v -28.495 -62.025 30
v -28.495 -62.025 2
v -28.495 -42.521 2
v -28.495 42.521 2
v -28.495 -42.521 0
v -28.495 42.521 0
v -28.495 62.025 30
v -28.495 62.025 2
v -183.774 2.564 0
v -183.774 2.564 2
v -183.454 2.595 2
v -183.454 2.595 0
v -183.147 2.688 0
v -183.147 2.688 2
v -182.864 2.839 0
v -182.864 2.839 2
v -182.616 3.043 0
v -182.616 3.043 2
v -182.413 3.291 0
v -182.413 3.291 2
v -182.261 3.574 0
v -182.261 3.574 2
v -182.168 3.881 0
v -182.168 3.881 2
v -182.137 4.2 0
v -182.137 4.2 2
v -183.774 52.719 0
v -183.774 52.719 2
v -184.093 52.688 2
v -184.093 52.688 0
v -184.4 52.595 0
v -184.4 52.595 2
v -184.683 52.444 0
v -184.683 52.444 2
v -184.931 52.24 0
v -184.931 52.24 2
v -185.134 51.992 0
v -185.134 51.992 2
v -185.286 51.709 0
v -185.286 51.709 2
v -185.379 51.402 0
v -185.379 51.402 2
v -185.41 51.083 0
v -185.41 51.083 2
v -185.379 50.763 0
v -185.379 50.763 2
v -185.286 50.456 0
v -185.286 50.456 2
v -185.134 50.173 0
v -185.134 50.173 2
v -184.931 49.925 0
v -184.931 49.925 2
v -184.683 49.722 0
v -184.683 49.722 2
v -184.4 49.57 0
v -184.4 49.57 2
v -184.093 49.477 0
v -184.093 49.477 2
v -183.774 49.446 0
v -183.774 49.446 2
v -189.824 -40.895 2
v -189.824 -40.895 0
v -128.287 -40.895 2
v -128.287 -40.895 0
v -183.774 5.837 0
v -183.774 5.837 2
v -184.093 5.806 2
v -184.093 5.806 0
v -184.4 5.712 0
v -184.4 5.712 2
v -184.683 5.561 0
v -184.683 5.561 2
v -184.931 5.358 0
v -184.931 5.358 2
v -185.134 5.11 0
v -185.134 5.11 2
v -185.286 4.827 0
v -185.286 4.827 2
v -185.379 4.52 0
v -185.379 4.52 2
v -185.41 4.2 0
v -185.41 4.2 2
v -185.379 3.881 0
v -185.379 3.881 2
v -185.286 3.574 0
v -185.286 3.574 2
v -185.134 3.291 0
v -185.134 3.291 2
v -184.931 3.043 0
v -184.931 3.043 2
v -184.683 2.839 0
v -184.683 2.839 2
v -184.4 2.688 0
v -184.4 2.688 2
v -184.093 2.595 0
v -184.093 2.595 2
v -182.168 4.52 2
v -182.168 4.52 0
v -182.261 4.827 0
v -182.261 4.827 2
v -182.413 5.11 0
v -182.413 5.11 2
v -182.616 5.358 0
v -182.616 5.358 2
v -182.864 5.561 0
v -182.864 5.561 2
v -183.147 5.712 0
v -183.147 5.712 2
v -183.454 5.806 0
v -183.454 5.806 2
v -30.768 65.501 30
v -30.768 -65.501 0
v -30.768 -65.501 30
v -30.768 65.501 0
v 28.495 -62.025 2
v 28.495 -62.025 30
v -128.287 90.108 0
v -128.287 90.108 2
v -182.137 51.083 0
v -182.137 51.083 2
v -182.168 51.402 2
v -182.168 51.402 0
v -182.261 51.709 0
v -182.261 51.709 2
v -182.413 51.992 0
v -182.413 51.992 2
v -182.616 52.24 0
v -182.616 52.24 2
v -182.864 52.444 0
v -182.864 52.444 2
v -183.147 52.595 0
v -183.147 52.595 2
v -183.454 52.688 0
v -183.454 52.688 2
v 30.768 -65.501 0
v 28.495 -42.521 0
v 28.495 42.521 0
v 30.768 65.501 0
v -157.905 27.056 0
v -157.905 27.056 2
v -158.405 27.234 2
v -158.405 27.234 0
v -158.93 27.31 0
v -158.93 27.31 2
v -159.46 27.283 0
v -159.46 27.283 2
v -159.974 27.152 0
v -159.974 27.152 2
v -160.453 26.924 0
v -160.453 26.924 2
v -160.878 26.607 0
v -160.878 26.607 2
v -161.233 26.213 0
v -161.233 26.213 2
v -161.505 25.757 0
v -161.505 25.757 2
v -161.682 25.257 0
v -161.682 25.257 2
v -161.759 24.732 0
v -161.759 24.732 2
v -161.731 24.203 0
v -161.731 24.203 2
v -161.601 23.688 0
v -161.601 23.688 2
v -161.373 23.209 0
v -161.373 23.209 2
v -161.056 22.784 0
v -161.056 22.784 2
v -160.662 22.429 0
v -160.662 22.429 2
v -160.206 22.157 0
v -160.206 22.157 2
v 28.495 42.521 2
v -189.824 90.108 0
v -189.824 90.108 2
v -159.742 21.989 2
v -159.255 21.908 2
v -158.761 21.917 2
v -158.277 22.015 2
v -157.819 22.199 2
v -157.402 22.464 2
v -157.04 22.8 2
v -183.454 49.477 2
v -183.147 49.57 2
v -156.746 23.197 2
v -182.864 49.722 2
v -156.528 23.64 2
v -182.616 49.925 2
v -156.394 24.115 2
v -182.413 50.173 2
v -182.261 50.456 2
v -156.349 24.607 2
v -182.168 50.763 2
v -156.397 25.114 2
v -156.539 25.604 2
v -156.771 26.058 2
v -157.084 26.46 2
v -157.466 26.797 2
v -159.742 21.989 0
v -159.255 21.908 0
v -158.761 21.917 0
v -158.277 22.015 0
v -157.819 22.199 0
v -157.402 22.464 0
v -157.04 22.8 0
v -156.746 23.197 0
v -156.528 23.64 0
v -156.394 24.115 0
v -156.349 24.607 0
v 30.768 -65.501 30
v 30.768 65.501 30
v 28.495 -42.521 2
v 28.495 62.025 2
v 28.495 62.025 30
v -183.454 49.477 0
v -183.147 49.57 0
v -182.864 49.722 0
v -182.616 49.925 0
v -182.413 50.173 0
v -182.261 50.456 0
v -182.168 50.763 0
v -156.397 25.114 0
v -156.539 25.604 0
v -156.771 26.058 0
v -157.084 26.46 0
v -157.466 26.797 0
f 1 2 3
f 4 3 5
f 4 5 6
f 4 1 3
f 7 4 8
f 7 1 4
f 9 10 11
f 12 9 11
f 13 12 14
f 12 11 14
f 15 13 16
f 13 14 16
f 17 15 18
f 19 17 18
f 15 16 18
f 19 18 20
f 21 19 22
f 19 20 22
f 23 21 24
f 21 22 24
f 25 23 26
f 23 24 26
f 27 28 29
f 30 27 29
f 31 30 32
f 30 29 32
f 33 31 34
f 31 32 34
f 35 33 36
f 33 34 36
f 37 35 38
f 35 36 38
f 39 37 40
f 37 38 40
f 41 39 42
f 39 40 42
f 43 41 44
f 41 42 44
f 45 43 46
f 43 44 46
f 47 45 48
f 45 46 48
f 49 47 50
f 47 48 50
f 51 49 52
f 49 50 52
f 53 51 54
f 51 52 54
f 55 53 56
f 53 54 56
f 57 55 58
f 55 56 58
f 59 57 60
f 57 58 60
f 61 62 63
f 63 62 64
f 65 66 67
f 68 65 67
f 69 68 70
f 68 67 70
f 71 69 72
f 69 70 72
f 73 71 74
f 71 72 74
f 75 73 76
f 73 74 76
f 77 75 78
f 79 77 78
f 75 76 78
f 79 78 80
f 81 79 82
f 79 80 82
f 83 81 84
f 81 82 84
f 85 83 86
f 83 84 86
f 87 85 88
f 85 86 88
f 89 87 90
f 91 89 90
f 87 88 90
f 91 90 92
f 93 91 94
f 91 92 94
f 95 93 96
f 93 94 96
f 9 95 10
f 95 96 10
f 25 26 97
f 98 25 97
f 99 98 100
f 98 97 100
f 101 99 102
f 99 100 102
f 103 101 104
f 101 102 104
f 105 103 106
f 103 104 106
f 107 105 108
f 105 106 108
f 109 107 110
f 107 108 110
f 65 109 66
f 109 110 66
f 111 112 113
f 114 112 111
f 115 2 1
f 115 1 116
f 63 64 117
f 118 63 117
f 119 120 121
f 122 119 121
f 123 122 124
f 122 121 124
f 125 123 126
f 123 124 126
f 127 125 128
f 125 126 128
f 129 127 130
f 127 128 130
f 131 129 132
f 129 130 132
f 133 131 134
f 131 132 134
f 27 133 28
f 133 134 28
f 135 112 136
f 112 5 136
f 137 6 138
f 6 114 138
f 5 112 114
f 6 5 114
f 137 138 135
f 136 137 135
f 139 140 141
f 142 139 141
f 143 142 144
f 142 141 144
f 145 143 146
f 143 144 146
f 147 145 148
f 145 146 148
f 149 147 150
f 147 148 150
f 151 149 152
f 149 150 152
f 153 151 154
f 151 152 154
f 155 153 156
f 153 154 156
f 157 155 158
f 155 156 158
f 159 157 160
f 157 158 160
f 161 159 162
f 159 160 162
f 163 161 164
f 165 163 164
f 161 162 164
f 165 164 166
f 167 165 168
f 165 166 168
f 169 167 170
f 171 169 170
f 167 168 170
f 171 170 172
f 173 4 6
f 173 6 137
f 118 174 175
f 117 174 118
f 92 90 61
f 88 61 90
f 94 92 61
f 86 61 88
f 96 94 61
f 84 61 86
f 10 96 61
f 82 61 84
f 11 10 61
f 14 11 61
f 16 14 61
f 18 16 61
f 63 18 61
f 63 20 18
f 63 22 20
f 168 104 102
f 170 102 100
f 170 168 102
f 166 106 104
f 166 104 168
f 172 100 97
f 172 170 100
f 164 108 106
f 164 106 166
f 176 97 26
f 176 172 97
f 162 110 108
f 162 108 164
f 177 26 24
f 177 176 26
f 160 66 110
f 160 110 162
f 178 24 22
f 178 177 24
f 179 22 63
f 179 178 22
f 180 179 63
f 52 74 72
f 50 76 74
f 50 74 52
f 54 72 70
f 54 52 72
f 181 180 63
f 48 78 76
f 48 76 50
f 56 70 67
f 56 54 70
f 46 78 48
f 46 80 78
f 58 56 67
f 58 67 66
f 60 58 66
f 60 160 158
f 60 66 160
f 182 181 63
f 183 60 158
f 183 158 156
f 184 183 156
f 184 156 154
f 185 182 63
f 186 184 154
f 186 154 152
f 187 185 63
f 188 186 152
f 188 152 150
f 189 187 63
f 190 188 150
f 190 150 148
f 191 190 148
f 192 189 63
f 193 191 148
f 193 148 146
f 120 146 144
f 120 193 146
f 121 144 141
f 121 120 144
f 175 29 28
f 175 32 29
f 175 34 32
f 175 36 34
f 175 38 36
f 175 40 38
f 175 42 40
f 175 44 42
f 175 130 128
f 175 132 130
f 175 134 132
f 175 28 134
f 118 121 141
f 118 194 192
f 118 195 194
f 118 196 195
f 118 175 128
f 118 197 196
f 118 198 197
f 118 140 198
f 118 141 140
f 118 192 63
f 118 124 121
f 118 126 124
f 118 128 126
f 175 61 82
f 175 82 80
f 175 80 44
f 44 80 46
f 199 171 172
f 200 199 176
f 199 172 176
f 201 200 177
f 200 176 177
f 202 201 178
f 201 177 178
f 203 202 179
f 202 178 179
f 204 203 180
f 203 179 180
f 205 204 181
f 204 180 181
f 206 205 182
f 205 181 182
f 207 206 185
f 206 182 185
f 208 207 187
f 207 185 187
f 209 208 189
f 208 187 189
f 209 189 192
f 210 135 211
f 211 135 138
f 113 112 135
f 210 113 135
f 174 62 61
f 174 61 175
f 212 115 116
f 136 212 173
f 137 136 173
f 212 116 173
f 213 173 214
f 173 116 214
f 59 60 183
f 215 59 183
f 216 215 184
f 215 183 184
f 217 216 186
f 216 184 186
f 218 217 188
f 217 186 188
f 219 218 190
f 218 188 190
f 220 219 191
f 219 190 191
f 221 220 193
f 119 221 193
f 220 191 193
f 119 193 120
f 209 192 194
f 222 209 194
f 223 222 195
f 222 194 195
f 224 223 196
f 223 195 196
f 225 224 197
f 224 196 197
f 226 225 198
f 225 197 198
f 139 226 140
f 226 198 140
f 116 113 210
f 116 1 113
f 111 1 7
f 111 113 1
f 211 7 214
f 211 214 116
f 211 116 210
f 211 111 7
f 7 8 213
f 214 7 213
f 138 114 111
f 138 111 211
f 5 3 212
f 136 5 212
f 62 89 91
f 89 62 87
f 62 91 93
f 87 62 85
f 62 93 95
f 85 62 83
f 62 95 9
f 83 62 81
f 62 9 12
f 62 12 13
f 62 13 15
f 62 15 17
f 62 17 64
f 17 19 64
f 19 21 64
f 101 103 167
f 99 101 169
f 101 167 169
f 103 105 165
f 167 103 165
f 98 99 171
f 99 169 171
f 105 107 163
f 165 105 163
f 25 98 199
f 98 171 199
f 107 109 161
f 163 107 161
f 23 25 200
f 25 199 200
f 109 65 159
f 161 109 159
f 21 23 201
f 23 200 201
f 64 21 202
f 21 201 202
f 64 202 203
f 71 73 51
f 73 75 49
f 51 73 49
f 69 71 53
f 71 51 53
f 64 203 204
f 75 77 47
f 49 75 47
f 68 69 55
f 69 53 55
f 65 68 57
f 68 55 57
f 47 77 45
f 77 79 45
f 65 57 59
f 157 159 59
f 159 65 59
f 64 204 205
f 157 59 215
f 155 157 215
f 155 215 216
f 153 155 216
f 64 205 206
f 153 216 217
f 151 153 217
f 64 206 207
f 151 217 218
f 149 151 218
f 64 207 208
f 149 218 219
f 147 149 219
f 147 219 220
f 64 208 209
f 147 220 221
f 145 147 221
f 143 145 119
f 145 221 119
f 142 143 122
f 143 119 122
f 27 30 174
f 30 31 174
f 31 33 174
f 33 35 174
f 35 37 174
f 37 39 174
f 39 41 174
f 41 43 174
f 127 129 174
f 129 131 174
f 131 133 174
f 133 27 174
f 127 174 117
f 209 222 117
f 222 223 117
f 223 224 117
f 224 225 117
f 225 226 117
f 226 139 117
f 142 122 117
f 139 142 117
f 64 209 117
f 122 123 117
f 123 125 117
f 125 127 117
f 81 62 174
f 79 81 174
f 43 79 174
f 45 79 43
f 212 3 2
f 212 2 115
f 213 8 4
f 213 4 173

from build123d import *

# Parameters (mm, degrees)
F0_W     = 61.5360587835
F0_H     = 131.0026943684
F0_W_2   = 56.9904185832
F0_H_2   = 124.0508854389
F1_DEPTH = 30
F2_DEPTH = 2
F3_W     = 56.9904185832
F3_H     = 85.0419774652
F4_DEPTH = 25
F5_W     = 61.5360587835
F5_H     = 131.0026943684
F5_W_2   = 56.9904185832
F5_H_2   = 124.0508854389
F6_DEPTH = 2
F8_DEPTH = 25


with BuildPart() as f1:
    # F0 (on Top) → F1 (new body)
    with BuildSketch(Plane.XY):
        Rectangle(F0_W, F0_H)
        Rectangle(F0_W_2, F0_H_2, mode=Mode.SUBTRACT)
    extrude(amount=F1_DEPTH)

    # F0 (on Top) → F2 (join)
    with BuildSketch(Plane.XY):
        Rectangle(F0_W_2, F0_H_2)
    extrude(amount=F2_DEPTH)

    # F3 (on face) → F4 (cut)
    with BuildSketch(Plane.XY.offset(2)):
        Rectangle(F3_W, F3_H)
    extrude(amount=-F4_DEPTH, mode=Mode.SUBTRACT)


with BuildPart() as f6:
    # F5 (on Top) → F6 (new body)
    with BuildSketch(Plane.XY):
        with Locations((-159.0554714203, 24.6067997068)):
            Rectangle(F5_W, F5_H)
        with Locations((-159.0554714203, 24.6067997068)):
            Rectangle(F5_W_2, F5_H_2, mode=Mode.SUBTRACT)
        with Locations((-159.0554714203, 24.6067997068)):
            Rectangle(F5_W_2, F5_H_2)
    extrude(amount=F6_DEPTH)

    # F7 (on face) → F8 (cut)
    with BuildSketch(Plane.XY.offset(2)):
        with BuildLine():
            Line((-183.773547411, 49.4459015969), (-183.773547411, 52.7193801757))
            ThreePointArc((-183.773547411, 52.7193801757), (-185.4102867004, 51.0826408863), (-183.773547411, 49.4459015969))
        make_face()
        with BuildLine():
            ThreePointArc((-182.1368081215, 51.0826408863), (-182.6161979604, 52.2399903369), (-183.773547411, 52.7193801757))
            Line((-183.773547411, 52.7193801757), (-183.773547411, 49.4459015969))
            ThreePointArc((-183.773547411, 49.4459015969), (-182.6161979604, 49.9252914357), (-182.1368081215, 51.0826408863))
        make_face()
        with BuildLine():
            ThreePointArc((-156.3492098156, 24.6067997068), (-156.770993957, 26.0576665487), (-157.904872128, 27.0562839671))
            Line((-157.904872128, 27.0562839671), (-160.2060707126, 22.1573154465))
            ThreePointArc((-160.2060707126, 22.1573154465), (-157.6046045784, 22.3223222436), (-156.3492098156, 24.6067997068))
        make_face()
        with BuildLine():
            Line((-160.2060707126, 22.1573154465), (-157.904872128, 27.0562839671))
            ThreePointArc((-157.904872128, 27.0562839671), (-161.5049556806, 25.7573989991), (-160.2060707126, 22.1573154465))
        make_face()
        with BuildLine():
            ThreePointArc((-182.1368081215, 4.2002452537), (-182.6161979604, 5.3575947043), (-183.773547411, 5.8369845432))
            Line((-183.773547411, 5.8369845432), (-183.773547411, 2.5635059643))
            ThreePointArc((-183.773547411, 2.5635059643), (-182.6161979604, 3.0428958032), (-182.1368081215, 4.2002452537))
        make_face()
        with BuildLine():
            Line((-183.773547411, 2.5635059643), (-183.773547411, 5.8369845432))
            ThreePointArc((-183.773547411, 5.8369845432), (-185.4102867004, 4.2002452537), (-183.773547411, 2.5635059643))
        make_face()
    extrude(amount=-F8_DEPTH, mode=Mode.SUBTRACT)


solid = Compound([f1.part, f6.part])
